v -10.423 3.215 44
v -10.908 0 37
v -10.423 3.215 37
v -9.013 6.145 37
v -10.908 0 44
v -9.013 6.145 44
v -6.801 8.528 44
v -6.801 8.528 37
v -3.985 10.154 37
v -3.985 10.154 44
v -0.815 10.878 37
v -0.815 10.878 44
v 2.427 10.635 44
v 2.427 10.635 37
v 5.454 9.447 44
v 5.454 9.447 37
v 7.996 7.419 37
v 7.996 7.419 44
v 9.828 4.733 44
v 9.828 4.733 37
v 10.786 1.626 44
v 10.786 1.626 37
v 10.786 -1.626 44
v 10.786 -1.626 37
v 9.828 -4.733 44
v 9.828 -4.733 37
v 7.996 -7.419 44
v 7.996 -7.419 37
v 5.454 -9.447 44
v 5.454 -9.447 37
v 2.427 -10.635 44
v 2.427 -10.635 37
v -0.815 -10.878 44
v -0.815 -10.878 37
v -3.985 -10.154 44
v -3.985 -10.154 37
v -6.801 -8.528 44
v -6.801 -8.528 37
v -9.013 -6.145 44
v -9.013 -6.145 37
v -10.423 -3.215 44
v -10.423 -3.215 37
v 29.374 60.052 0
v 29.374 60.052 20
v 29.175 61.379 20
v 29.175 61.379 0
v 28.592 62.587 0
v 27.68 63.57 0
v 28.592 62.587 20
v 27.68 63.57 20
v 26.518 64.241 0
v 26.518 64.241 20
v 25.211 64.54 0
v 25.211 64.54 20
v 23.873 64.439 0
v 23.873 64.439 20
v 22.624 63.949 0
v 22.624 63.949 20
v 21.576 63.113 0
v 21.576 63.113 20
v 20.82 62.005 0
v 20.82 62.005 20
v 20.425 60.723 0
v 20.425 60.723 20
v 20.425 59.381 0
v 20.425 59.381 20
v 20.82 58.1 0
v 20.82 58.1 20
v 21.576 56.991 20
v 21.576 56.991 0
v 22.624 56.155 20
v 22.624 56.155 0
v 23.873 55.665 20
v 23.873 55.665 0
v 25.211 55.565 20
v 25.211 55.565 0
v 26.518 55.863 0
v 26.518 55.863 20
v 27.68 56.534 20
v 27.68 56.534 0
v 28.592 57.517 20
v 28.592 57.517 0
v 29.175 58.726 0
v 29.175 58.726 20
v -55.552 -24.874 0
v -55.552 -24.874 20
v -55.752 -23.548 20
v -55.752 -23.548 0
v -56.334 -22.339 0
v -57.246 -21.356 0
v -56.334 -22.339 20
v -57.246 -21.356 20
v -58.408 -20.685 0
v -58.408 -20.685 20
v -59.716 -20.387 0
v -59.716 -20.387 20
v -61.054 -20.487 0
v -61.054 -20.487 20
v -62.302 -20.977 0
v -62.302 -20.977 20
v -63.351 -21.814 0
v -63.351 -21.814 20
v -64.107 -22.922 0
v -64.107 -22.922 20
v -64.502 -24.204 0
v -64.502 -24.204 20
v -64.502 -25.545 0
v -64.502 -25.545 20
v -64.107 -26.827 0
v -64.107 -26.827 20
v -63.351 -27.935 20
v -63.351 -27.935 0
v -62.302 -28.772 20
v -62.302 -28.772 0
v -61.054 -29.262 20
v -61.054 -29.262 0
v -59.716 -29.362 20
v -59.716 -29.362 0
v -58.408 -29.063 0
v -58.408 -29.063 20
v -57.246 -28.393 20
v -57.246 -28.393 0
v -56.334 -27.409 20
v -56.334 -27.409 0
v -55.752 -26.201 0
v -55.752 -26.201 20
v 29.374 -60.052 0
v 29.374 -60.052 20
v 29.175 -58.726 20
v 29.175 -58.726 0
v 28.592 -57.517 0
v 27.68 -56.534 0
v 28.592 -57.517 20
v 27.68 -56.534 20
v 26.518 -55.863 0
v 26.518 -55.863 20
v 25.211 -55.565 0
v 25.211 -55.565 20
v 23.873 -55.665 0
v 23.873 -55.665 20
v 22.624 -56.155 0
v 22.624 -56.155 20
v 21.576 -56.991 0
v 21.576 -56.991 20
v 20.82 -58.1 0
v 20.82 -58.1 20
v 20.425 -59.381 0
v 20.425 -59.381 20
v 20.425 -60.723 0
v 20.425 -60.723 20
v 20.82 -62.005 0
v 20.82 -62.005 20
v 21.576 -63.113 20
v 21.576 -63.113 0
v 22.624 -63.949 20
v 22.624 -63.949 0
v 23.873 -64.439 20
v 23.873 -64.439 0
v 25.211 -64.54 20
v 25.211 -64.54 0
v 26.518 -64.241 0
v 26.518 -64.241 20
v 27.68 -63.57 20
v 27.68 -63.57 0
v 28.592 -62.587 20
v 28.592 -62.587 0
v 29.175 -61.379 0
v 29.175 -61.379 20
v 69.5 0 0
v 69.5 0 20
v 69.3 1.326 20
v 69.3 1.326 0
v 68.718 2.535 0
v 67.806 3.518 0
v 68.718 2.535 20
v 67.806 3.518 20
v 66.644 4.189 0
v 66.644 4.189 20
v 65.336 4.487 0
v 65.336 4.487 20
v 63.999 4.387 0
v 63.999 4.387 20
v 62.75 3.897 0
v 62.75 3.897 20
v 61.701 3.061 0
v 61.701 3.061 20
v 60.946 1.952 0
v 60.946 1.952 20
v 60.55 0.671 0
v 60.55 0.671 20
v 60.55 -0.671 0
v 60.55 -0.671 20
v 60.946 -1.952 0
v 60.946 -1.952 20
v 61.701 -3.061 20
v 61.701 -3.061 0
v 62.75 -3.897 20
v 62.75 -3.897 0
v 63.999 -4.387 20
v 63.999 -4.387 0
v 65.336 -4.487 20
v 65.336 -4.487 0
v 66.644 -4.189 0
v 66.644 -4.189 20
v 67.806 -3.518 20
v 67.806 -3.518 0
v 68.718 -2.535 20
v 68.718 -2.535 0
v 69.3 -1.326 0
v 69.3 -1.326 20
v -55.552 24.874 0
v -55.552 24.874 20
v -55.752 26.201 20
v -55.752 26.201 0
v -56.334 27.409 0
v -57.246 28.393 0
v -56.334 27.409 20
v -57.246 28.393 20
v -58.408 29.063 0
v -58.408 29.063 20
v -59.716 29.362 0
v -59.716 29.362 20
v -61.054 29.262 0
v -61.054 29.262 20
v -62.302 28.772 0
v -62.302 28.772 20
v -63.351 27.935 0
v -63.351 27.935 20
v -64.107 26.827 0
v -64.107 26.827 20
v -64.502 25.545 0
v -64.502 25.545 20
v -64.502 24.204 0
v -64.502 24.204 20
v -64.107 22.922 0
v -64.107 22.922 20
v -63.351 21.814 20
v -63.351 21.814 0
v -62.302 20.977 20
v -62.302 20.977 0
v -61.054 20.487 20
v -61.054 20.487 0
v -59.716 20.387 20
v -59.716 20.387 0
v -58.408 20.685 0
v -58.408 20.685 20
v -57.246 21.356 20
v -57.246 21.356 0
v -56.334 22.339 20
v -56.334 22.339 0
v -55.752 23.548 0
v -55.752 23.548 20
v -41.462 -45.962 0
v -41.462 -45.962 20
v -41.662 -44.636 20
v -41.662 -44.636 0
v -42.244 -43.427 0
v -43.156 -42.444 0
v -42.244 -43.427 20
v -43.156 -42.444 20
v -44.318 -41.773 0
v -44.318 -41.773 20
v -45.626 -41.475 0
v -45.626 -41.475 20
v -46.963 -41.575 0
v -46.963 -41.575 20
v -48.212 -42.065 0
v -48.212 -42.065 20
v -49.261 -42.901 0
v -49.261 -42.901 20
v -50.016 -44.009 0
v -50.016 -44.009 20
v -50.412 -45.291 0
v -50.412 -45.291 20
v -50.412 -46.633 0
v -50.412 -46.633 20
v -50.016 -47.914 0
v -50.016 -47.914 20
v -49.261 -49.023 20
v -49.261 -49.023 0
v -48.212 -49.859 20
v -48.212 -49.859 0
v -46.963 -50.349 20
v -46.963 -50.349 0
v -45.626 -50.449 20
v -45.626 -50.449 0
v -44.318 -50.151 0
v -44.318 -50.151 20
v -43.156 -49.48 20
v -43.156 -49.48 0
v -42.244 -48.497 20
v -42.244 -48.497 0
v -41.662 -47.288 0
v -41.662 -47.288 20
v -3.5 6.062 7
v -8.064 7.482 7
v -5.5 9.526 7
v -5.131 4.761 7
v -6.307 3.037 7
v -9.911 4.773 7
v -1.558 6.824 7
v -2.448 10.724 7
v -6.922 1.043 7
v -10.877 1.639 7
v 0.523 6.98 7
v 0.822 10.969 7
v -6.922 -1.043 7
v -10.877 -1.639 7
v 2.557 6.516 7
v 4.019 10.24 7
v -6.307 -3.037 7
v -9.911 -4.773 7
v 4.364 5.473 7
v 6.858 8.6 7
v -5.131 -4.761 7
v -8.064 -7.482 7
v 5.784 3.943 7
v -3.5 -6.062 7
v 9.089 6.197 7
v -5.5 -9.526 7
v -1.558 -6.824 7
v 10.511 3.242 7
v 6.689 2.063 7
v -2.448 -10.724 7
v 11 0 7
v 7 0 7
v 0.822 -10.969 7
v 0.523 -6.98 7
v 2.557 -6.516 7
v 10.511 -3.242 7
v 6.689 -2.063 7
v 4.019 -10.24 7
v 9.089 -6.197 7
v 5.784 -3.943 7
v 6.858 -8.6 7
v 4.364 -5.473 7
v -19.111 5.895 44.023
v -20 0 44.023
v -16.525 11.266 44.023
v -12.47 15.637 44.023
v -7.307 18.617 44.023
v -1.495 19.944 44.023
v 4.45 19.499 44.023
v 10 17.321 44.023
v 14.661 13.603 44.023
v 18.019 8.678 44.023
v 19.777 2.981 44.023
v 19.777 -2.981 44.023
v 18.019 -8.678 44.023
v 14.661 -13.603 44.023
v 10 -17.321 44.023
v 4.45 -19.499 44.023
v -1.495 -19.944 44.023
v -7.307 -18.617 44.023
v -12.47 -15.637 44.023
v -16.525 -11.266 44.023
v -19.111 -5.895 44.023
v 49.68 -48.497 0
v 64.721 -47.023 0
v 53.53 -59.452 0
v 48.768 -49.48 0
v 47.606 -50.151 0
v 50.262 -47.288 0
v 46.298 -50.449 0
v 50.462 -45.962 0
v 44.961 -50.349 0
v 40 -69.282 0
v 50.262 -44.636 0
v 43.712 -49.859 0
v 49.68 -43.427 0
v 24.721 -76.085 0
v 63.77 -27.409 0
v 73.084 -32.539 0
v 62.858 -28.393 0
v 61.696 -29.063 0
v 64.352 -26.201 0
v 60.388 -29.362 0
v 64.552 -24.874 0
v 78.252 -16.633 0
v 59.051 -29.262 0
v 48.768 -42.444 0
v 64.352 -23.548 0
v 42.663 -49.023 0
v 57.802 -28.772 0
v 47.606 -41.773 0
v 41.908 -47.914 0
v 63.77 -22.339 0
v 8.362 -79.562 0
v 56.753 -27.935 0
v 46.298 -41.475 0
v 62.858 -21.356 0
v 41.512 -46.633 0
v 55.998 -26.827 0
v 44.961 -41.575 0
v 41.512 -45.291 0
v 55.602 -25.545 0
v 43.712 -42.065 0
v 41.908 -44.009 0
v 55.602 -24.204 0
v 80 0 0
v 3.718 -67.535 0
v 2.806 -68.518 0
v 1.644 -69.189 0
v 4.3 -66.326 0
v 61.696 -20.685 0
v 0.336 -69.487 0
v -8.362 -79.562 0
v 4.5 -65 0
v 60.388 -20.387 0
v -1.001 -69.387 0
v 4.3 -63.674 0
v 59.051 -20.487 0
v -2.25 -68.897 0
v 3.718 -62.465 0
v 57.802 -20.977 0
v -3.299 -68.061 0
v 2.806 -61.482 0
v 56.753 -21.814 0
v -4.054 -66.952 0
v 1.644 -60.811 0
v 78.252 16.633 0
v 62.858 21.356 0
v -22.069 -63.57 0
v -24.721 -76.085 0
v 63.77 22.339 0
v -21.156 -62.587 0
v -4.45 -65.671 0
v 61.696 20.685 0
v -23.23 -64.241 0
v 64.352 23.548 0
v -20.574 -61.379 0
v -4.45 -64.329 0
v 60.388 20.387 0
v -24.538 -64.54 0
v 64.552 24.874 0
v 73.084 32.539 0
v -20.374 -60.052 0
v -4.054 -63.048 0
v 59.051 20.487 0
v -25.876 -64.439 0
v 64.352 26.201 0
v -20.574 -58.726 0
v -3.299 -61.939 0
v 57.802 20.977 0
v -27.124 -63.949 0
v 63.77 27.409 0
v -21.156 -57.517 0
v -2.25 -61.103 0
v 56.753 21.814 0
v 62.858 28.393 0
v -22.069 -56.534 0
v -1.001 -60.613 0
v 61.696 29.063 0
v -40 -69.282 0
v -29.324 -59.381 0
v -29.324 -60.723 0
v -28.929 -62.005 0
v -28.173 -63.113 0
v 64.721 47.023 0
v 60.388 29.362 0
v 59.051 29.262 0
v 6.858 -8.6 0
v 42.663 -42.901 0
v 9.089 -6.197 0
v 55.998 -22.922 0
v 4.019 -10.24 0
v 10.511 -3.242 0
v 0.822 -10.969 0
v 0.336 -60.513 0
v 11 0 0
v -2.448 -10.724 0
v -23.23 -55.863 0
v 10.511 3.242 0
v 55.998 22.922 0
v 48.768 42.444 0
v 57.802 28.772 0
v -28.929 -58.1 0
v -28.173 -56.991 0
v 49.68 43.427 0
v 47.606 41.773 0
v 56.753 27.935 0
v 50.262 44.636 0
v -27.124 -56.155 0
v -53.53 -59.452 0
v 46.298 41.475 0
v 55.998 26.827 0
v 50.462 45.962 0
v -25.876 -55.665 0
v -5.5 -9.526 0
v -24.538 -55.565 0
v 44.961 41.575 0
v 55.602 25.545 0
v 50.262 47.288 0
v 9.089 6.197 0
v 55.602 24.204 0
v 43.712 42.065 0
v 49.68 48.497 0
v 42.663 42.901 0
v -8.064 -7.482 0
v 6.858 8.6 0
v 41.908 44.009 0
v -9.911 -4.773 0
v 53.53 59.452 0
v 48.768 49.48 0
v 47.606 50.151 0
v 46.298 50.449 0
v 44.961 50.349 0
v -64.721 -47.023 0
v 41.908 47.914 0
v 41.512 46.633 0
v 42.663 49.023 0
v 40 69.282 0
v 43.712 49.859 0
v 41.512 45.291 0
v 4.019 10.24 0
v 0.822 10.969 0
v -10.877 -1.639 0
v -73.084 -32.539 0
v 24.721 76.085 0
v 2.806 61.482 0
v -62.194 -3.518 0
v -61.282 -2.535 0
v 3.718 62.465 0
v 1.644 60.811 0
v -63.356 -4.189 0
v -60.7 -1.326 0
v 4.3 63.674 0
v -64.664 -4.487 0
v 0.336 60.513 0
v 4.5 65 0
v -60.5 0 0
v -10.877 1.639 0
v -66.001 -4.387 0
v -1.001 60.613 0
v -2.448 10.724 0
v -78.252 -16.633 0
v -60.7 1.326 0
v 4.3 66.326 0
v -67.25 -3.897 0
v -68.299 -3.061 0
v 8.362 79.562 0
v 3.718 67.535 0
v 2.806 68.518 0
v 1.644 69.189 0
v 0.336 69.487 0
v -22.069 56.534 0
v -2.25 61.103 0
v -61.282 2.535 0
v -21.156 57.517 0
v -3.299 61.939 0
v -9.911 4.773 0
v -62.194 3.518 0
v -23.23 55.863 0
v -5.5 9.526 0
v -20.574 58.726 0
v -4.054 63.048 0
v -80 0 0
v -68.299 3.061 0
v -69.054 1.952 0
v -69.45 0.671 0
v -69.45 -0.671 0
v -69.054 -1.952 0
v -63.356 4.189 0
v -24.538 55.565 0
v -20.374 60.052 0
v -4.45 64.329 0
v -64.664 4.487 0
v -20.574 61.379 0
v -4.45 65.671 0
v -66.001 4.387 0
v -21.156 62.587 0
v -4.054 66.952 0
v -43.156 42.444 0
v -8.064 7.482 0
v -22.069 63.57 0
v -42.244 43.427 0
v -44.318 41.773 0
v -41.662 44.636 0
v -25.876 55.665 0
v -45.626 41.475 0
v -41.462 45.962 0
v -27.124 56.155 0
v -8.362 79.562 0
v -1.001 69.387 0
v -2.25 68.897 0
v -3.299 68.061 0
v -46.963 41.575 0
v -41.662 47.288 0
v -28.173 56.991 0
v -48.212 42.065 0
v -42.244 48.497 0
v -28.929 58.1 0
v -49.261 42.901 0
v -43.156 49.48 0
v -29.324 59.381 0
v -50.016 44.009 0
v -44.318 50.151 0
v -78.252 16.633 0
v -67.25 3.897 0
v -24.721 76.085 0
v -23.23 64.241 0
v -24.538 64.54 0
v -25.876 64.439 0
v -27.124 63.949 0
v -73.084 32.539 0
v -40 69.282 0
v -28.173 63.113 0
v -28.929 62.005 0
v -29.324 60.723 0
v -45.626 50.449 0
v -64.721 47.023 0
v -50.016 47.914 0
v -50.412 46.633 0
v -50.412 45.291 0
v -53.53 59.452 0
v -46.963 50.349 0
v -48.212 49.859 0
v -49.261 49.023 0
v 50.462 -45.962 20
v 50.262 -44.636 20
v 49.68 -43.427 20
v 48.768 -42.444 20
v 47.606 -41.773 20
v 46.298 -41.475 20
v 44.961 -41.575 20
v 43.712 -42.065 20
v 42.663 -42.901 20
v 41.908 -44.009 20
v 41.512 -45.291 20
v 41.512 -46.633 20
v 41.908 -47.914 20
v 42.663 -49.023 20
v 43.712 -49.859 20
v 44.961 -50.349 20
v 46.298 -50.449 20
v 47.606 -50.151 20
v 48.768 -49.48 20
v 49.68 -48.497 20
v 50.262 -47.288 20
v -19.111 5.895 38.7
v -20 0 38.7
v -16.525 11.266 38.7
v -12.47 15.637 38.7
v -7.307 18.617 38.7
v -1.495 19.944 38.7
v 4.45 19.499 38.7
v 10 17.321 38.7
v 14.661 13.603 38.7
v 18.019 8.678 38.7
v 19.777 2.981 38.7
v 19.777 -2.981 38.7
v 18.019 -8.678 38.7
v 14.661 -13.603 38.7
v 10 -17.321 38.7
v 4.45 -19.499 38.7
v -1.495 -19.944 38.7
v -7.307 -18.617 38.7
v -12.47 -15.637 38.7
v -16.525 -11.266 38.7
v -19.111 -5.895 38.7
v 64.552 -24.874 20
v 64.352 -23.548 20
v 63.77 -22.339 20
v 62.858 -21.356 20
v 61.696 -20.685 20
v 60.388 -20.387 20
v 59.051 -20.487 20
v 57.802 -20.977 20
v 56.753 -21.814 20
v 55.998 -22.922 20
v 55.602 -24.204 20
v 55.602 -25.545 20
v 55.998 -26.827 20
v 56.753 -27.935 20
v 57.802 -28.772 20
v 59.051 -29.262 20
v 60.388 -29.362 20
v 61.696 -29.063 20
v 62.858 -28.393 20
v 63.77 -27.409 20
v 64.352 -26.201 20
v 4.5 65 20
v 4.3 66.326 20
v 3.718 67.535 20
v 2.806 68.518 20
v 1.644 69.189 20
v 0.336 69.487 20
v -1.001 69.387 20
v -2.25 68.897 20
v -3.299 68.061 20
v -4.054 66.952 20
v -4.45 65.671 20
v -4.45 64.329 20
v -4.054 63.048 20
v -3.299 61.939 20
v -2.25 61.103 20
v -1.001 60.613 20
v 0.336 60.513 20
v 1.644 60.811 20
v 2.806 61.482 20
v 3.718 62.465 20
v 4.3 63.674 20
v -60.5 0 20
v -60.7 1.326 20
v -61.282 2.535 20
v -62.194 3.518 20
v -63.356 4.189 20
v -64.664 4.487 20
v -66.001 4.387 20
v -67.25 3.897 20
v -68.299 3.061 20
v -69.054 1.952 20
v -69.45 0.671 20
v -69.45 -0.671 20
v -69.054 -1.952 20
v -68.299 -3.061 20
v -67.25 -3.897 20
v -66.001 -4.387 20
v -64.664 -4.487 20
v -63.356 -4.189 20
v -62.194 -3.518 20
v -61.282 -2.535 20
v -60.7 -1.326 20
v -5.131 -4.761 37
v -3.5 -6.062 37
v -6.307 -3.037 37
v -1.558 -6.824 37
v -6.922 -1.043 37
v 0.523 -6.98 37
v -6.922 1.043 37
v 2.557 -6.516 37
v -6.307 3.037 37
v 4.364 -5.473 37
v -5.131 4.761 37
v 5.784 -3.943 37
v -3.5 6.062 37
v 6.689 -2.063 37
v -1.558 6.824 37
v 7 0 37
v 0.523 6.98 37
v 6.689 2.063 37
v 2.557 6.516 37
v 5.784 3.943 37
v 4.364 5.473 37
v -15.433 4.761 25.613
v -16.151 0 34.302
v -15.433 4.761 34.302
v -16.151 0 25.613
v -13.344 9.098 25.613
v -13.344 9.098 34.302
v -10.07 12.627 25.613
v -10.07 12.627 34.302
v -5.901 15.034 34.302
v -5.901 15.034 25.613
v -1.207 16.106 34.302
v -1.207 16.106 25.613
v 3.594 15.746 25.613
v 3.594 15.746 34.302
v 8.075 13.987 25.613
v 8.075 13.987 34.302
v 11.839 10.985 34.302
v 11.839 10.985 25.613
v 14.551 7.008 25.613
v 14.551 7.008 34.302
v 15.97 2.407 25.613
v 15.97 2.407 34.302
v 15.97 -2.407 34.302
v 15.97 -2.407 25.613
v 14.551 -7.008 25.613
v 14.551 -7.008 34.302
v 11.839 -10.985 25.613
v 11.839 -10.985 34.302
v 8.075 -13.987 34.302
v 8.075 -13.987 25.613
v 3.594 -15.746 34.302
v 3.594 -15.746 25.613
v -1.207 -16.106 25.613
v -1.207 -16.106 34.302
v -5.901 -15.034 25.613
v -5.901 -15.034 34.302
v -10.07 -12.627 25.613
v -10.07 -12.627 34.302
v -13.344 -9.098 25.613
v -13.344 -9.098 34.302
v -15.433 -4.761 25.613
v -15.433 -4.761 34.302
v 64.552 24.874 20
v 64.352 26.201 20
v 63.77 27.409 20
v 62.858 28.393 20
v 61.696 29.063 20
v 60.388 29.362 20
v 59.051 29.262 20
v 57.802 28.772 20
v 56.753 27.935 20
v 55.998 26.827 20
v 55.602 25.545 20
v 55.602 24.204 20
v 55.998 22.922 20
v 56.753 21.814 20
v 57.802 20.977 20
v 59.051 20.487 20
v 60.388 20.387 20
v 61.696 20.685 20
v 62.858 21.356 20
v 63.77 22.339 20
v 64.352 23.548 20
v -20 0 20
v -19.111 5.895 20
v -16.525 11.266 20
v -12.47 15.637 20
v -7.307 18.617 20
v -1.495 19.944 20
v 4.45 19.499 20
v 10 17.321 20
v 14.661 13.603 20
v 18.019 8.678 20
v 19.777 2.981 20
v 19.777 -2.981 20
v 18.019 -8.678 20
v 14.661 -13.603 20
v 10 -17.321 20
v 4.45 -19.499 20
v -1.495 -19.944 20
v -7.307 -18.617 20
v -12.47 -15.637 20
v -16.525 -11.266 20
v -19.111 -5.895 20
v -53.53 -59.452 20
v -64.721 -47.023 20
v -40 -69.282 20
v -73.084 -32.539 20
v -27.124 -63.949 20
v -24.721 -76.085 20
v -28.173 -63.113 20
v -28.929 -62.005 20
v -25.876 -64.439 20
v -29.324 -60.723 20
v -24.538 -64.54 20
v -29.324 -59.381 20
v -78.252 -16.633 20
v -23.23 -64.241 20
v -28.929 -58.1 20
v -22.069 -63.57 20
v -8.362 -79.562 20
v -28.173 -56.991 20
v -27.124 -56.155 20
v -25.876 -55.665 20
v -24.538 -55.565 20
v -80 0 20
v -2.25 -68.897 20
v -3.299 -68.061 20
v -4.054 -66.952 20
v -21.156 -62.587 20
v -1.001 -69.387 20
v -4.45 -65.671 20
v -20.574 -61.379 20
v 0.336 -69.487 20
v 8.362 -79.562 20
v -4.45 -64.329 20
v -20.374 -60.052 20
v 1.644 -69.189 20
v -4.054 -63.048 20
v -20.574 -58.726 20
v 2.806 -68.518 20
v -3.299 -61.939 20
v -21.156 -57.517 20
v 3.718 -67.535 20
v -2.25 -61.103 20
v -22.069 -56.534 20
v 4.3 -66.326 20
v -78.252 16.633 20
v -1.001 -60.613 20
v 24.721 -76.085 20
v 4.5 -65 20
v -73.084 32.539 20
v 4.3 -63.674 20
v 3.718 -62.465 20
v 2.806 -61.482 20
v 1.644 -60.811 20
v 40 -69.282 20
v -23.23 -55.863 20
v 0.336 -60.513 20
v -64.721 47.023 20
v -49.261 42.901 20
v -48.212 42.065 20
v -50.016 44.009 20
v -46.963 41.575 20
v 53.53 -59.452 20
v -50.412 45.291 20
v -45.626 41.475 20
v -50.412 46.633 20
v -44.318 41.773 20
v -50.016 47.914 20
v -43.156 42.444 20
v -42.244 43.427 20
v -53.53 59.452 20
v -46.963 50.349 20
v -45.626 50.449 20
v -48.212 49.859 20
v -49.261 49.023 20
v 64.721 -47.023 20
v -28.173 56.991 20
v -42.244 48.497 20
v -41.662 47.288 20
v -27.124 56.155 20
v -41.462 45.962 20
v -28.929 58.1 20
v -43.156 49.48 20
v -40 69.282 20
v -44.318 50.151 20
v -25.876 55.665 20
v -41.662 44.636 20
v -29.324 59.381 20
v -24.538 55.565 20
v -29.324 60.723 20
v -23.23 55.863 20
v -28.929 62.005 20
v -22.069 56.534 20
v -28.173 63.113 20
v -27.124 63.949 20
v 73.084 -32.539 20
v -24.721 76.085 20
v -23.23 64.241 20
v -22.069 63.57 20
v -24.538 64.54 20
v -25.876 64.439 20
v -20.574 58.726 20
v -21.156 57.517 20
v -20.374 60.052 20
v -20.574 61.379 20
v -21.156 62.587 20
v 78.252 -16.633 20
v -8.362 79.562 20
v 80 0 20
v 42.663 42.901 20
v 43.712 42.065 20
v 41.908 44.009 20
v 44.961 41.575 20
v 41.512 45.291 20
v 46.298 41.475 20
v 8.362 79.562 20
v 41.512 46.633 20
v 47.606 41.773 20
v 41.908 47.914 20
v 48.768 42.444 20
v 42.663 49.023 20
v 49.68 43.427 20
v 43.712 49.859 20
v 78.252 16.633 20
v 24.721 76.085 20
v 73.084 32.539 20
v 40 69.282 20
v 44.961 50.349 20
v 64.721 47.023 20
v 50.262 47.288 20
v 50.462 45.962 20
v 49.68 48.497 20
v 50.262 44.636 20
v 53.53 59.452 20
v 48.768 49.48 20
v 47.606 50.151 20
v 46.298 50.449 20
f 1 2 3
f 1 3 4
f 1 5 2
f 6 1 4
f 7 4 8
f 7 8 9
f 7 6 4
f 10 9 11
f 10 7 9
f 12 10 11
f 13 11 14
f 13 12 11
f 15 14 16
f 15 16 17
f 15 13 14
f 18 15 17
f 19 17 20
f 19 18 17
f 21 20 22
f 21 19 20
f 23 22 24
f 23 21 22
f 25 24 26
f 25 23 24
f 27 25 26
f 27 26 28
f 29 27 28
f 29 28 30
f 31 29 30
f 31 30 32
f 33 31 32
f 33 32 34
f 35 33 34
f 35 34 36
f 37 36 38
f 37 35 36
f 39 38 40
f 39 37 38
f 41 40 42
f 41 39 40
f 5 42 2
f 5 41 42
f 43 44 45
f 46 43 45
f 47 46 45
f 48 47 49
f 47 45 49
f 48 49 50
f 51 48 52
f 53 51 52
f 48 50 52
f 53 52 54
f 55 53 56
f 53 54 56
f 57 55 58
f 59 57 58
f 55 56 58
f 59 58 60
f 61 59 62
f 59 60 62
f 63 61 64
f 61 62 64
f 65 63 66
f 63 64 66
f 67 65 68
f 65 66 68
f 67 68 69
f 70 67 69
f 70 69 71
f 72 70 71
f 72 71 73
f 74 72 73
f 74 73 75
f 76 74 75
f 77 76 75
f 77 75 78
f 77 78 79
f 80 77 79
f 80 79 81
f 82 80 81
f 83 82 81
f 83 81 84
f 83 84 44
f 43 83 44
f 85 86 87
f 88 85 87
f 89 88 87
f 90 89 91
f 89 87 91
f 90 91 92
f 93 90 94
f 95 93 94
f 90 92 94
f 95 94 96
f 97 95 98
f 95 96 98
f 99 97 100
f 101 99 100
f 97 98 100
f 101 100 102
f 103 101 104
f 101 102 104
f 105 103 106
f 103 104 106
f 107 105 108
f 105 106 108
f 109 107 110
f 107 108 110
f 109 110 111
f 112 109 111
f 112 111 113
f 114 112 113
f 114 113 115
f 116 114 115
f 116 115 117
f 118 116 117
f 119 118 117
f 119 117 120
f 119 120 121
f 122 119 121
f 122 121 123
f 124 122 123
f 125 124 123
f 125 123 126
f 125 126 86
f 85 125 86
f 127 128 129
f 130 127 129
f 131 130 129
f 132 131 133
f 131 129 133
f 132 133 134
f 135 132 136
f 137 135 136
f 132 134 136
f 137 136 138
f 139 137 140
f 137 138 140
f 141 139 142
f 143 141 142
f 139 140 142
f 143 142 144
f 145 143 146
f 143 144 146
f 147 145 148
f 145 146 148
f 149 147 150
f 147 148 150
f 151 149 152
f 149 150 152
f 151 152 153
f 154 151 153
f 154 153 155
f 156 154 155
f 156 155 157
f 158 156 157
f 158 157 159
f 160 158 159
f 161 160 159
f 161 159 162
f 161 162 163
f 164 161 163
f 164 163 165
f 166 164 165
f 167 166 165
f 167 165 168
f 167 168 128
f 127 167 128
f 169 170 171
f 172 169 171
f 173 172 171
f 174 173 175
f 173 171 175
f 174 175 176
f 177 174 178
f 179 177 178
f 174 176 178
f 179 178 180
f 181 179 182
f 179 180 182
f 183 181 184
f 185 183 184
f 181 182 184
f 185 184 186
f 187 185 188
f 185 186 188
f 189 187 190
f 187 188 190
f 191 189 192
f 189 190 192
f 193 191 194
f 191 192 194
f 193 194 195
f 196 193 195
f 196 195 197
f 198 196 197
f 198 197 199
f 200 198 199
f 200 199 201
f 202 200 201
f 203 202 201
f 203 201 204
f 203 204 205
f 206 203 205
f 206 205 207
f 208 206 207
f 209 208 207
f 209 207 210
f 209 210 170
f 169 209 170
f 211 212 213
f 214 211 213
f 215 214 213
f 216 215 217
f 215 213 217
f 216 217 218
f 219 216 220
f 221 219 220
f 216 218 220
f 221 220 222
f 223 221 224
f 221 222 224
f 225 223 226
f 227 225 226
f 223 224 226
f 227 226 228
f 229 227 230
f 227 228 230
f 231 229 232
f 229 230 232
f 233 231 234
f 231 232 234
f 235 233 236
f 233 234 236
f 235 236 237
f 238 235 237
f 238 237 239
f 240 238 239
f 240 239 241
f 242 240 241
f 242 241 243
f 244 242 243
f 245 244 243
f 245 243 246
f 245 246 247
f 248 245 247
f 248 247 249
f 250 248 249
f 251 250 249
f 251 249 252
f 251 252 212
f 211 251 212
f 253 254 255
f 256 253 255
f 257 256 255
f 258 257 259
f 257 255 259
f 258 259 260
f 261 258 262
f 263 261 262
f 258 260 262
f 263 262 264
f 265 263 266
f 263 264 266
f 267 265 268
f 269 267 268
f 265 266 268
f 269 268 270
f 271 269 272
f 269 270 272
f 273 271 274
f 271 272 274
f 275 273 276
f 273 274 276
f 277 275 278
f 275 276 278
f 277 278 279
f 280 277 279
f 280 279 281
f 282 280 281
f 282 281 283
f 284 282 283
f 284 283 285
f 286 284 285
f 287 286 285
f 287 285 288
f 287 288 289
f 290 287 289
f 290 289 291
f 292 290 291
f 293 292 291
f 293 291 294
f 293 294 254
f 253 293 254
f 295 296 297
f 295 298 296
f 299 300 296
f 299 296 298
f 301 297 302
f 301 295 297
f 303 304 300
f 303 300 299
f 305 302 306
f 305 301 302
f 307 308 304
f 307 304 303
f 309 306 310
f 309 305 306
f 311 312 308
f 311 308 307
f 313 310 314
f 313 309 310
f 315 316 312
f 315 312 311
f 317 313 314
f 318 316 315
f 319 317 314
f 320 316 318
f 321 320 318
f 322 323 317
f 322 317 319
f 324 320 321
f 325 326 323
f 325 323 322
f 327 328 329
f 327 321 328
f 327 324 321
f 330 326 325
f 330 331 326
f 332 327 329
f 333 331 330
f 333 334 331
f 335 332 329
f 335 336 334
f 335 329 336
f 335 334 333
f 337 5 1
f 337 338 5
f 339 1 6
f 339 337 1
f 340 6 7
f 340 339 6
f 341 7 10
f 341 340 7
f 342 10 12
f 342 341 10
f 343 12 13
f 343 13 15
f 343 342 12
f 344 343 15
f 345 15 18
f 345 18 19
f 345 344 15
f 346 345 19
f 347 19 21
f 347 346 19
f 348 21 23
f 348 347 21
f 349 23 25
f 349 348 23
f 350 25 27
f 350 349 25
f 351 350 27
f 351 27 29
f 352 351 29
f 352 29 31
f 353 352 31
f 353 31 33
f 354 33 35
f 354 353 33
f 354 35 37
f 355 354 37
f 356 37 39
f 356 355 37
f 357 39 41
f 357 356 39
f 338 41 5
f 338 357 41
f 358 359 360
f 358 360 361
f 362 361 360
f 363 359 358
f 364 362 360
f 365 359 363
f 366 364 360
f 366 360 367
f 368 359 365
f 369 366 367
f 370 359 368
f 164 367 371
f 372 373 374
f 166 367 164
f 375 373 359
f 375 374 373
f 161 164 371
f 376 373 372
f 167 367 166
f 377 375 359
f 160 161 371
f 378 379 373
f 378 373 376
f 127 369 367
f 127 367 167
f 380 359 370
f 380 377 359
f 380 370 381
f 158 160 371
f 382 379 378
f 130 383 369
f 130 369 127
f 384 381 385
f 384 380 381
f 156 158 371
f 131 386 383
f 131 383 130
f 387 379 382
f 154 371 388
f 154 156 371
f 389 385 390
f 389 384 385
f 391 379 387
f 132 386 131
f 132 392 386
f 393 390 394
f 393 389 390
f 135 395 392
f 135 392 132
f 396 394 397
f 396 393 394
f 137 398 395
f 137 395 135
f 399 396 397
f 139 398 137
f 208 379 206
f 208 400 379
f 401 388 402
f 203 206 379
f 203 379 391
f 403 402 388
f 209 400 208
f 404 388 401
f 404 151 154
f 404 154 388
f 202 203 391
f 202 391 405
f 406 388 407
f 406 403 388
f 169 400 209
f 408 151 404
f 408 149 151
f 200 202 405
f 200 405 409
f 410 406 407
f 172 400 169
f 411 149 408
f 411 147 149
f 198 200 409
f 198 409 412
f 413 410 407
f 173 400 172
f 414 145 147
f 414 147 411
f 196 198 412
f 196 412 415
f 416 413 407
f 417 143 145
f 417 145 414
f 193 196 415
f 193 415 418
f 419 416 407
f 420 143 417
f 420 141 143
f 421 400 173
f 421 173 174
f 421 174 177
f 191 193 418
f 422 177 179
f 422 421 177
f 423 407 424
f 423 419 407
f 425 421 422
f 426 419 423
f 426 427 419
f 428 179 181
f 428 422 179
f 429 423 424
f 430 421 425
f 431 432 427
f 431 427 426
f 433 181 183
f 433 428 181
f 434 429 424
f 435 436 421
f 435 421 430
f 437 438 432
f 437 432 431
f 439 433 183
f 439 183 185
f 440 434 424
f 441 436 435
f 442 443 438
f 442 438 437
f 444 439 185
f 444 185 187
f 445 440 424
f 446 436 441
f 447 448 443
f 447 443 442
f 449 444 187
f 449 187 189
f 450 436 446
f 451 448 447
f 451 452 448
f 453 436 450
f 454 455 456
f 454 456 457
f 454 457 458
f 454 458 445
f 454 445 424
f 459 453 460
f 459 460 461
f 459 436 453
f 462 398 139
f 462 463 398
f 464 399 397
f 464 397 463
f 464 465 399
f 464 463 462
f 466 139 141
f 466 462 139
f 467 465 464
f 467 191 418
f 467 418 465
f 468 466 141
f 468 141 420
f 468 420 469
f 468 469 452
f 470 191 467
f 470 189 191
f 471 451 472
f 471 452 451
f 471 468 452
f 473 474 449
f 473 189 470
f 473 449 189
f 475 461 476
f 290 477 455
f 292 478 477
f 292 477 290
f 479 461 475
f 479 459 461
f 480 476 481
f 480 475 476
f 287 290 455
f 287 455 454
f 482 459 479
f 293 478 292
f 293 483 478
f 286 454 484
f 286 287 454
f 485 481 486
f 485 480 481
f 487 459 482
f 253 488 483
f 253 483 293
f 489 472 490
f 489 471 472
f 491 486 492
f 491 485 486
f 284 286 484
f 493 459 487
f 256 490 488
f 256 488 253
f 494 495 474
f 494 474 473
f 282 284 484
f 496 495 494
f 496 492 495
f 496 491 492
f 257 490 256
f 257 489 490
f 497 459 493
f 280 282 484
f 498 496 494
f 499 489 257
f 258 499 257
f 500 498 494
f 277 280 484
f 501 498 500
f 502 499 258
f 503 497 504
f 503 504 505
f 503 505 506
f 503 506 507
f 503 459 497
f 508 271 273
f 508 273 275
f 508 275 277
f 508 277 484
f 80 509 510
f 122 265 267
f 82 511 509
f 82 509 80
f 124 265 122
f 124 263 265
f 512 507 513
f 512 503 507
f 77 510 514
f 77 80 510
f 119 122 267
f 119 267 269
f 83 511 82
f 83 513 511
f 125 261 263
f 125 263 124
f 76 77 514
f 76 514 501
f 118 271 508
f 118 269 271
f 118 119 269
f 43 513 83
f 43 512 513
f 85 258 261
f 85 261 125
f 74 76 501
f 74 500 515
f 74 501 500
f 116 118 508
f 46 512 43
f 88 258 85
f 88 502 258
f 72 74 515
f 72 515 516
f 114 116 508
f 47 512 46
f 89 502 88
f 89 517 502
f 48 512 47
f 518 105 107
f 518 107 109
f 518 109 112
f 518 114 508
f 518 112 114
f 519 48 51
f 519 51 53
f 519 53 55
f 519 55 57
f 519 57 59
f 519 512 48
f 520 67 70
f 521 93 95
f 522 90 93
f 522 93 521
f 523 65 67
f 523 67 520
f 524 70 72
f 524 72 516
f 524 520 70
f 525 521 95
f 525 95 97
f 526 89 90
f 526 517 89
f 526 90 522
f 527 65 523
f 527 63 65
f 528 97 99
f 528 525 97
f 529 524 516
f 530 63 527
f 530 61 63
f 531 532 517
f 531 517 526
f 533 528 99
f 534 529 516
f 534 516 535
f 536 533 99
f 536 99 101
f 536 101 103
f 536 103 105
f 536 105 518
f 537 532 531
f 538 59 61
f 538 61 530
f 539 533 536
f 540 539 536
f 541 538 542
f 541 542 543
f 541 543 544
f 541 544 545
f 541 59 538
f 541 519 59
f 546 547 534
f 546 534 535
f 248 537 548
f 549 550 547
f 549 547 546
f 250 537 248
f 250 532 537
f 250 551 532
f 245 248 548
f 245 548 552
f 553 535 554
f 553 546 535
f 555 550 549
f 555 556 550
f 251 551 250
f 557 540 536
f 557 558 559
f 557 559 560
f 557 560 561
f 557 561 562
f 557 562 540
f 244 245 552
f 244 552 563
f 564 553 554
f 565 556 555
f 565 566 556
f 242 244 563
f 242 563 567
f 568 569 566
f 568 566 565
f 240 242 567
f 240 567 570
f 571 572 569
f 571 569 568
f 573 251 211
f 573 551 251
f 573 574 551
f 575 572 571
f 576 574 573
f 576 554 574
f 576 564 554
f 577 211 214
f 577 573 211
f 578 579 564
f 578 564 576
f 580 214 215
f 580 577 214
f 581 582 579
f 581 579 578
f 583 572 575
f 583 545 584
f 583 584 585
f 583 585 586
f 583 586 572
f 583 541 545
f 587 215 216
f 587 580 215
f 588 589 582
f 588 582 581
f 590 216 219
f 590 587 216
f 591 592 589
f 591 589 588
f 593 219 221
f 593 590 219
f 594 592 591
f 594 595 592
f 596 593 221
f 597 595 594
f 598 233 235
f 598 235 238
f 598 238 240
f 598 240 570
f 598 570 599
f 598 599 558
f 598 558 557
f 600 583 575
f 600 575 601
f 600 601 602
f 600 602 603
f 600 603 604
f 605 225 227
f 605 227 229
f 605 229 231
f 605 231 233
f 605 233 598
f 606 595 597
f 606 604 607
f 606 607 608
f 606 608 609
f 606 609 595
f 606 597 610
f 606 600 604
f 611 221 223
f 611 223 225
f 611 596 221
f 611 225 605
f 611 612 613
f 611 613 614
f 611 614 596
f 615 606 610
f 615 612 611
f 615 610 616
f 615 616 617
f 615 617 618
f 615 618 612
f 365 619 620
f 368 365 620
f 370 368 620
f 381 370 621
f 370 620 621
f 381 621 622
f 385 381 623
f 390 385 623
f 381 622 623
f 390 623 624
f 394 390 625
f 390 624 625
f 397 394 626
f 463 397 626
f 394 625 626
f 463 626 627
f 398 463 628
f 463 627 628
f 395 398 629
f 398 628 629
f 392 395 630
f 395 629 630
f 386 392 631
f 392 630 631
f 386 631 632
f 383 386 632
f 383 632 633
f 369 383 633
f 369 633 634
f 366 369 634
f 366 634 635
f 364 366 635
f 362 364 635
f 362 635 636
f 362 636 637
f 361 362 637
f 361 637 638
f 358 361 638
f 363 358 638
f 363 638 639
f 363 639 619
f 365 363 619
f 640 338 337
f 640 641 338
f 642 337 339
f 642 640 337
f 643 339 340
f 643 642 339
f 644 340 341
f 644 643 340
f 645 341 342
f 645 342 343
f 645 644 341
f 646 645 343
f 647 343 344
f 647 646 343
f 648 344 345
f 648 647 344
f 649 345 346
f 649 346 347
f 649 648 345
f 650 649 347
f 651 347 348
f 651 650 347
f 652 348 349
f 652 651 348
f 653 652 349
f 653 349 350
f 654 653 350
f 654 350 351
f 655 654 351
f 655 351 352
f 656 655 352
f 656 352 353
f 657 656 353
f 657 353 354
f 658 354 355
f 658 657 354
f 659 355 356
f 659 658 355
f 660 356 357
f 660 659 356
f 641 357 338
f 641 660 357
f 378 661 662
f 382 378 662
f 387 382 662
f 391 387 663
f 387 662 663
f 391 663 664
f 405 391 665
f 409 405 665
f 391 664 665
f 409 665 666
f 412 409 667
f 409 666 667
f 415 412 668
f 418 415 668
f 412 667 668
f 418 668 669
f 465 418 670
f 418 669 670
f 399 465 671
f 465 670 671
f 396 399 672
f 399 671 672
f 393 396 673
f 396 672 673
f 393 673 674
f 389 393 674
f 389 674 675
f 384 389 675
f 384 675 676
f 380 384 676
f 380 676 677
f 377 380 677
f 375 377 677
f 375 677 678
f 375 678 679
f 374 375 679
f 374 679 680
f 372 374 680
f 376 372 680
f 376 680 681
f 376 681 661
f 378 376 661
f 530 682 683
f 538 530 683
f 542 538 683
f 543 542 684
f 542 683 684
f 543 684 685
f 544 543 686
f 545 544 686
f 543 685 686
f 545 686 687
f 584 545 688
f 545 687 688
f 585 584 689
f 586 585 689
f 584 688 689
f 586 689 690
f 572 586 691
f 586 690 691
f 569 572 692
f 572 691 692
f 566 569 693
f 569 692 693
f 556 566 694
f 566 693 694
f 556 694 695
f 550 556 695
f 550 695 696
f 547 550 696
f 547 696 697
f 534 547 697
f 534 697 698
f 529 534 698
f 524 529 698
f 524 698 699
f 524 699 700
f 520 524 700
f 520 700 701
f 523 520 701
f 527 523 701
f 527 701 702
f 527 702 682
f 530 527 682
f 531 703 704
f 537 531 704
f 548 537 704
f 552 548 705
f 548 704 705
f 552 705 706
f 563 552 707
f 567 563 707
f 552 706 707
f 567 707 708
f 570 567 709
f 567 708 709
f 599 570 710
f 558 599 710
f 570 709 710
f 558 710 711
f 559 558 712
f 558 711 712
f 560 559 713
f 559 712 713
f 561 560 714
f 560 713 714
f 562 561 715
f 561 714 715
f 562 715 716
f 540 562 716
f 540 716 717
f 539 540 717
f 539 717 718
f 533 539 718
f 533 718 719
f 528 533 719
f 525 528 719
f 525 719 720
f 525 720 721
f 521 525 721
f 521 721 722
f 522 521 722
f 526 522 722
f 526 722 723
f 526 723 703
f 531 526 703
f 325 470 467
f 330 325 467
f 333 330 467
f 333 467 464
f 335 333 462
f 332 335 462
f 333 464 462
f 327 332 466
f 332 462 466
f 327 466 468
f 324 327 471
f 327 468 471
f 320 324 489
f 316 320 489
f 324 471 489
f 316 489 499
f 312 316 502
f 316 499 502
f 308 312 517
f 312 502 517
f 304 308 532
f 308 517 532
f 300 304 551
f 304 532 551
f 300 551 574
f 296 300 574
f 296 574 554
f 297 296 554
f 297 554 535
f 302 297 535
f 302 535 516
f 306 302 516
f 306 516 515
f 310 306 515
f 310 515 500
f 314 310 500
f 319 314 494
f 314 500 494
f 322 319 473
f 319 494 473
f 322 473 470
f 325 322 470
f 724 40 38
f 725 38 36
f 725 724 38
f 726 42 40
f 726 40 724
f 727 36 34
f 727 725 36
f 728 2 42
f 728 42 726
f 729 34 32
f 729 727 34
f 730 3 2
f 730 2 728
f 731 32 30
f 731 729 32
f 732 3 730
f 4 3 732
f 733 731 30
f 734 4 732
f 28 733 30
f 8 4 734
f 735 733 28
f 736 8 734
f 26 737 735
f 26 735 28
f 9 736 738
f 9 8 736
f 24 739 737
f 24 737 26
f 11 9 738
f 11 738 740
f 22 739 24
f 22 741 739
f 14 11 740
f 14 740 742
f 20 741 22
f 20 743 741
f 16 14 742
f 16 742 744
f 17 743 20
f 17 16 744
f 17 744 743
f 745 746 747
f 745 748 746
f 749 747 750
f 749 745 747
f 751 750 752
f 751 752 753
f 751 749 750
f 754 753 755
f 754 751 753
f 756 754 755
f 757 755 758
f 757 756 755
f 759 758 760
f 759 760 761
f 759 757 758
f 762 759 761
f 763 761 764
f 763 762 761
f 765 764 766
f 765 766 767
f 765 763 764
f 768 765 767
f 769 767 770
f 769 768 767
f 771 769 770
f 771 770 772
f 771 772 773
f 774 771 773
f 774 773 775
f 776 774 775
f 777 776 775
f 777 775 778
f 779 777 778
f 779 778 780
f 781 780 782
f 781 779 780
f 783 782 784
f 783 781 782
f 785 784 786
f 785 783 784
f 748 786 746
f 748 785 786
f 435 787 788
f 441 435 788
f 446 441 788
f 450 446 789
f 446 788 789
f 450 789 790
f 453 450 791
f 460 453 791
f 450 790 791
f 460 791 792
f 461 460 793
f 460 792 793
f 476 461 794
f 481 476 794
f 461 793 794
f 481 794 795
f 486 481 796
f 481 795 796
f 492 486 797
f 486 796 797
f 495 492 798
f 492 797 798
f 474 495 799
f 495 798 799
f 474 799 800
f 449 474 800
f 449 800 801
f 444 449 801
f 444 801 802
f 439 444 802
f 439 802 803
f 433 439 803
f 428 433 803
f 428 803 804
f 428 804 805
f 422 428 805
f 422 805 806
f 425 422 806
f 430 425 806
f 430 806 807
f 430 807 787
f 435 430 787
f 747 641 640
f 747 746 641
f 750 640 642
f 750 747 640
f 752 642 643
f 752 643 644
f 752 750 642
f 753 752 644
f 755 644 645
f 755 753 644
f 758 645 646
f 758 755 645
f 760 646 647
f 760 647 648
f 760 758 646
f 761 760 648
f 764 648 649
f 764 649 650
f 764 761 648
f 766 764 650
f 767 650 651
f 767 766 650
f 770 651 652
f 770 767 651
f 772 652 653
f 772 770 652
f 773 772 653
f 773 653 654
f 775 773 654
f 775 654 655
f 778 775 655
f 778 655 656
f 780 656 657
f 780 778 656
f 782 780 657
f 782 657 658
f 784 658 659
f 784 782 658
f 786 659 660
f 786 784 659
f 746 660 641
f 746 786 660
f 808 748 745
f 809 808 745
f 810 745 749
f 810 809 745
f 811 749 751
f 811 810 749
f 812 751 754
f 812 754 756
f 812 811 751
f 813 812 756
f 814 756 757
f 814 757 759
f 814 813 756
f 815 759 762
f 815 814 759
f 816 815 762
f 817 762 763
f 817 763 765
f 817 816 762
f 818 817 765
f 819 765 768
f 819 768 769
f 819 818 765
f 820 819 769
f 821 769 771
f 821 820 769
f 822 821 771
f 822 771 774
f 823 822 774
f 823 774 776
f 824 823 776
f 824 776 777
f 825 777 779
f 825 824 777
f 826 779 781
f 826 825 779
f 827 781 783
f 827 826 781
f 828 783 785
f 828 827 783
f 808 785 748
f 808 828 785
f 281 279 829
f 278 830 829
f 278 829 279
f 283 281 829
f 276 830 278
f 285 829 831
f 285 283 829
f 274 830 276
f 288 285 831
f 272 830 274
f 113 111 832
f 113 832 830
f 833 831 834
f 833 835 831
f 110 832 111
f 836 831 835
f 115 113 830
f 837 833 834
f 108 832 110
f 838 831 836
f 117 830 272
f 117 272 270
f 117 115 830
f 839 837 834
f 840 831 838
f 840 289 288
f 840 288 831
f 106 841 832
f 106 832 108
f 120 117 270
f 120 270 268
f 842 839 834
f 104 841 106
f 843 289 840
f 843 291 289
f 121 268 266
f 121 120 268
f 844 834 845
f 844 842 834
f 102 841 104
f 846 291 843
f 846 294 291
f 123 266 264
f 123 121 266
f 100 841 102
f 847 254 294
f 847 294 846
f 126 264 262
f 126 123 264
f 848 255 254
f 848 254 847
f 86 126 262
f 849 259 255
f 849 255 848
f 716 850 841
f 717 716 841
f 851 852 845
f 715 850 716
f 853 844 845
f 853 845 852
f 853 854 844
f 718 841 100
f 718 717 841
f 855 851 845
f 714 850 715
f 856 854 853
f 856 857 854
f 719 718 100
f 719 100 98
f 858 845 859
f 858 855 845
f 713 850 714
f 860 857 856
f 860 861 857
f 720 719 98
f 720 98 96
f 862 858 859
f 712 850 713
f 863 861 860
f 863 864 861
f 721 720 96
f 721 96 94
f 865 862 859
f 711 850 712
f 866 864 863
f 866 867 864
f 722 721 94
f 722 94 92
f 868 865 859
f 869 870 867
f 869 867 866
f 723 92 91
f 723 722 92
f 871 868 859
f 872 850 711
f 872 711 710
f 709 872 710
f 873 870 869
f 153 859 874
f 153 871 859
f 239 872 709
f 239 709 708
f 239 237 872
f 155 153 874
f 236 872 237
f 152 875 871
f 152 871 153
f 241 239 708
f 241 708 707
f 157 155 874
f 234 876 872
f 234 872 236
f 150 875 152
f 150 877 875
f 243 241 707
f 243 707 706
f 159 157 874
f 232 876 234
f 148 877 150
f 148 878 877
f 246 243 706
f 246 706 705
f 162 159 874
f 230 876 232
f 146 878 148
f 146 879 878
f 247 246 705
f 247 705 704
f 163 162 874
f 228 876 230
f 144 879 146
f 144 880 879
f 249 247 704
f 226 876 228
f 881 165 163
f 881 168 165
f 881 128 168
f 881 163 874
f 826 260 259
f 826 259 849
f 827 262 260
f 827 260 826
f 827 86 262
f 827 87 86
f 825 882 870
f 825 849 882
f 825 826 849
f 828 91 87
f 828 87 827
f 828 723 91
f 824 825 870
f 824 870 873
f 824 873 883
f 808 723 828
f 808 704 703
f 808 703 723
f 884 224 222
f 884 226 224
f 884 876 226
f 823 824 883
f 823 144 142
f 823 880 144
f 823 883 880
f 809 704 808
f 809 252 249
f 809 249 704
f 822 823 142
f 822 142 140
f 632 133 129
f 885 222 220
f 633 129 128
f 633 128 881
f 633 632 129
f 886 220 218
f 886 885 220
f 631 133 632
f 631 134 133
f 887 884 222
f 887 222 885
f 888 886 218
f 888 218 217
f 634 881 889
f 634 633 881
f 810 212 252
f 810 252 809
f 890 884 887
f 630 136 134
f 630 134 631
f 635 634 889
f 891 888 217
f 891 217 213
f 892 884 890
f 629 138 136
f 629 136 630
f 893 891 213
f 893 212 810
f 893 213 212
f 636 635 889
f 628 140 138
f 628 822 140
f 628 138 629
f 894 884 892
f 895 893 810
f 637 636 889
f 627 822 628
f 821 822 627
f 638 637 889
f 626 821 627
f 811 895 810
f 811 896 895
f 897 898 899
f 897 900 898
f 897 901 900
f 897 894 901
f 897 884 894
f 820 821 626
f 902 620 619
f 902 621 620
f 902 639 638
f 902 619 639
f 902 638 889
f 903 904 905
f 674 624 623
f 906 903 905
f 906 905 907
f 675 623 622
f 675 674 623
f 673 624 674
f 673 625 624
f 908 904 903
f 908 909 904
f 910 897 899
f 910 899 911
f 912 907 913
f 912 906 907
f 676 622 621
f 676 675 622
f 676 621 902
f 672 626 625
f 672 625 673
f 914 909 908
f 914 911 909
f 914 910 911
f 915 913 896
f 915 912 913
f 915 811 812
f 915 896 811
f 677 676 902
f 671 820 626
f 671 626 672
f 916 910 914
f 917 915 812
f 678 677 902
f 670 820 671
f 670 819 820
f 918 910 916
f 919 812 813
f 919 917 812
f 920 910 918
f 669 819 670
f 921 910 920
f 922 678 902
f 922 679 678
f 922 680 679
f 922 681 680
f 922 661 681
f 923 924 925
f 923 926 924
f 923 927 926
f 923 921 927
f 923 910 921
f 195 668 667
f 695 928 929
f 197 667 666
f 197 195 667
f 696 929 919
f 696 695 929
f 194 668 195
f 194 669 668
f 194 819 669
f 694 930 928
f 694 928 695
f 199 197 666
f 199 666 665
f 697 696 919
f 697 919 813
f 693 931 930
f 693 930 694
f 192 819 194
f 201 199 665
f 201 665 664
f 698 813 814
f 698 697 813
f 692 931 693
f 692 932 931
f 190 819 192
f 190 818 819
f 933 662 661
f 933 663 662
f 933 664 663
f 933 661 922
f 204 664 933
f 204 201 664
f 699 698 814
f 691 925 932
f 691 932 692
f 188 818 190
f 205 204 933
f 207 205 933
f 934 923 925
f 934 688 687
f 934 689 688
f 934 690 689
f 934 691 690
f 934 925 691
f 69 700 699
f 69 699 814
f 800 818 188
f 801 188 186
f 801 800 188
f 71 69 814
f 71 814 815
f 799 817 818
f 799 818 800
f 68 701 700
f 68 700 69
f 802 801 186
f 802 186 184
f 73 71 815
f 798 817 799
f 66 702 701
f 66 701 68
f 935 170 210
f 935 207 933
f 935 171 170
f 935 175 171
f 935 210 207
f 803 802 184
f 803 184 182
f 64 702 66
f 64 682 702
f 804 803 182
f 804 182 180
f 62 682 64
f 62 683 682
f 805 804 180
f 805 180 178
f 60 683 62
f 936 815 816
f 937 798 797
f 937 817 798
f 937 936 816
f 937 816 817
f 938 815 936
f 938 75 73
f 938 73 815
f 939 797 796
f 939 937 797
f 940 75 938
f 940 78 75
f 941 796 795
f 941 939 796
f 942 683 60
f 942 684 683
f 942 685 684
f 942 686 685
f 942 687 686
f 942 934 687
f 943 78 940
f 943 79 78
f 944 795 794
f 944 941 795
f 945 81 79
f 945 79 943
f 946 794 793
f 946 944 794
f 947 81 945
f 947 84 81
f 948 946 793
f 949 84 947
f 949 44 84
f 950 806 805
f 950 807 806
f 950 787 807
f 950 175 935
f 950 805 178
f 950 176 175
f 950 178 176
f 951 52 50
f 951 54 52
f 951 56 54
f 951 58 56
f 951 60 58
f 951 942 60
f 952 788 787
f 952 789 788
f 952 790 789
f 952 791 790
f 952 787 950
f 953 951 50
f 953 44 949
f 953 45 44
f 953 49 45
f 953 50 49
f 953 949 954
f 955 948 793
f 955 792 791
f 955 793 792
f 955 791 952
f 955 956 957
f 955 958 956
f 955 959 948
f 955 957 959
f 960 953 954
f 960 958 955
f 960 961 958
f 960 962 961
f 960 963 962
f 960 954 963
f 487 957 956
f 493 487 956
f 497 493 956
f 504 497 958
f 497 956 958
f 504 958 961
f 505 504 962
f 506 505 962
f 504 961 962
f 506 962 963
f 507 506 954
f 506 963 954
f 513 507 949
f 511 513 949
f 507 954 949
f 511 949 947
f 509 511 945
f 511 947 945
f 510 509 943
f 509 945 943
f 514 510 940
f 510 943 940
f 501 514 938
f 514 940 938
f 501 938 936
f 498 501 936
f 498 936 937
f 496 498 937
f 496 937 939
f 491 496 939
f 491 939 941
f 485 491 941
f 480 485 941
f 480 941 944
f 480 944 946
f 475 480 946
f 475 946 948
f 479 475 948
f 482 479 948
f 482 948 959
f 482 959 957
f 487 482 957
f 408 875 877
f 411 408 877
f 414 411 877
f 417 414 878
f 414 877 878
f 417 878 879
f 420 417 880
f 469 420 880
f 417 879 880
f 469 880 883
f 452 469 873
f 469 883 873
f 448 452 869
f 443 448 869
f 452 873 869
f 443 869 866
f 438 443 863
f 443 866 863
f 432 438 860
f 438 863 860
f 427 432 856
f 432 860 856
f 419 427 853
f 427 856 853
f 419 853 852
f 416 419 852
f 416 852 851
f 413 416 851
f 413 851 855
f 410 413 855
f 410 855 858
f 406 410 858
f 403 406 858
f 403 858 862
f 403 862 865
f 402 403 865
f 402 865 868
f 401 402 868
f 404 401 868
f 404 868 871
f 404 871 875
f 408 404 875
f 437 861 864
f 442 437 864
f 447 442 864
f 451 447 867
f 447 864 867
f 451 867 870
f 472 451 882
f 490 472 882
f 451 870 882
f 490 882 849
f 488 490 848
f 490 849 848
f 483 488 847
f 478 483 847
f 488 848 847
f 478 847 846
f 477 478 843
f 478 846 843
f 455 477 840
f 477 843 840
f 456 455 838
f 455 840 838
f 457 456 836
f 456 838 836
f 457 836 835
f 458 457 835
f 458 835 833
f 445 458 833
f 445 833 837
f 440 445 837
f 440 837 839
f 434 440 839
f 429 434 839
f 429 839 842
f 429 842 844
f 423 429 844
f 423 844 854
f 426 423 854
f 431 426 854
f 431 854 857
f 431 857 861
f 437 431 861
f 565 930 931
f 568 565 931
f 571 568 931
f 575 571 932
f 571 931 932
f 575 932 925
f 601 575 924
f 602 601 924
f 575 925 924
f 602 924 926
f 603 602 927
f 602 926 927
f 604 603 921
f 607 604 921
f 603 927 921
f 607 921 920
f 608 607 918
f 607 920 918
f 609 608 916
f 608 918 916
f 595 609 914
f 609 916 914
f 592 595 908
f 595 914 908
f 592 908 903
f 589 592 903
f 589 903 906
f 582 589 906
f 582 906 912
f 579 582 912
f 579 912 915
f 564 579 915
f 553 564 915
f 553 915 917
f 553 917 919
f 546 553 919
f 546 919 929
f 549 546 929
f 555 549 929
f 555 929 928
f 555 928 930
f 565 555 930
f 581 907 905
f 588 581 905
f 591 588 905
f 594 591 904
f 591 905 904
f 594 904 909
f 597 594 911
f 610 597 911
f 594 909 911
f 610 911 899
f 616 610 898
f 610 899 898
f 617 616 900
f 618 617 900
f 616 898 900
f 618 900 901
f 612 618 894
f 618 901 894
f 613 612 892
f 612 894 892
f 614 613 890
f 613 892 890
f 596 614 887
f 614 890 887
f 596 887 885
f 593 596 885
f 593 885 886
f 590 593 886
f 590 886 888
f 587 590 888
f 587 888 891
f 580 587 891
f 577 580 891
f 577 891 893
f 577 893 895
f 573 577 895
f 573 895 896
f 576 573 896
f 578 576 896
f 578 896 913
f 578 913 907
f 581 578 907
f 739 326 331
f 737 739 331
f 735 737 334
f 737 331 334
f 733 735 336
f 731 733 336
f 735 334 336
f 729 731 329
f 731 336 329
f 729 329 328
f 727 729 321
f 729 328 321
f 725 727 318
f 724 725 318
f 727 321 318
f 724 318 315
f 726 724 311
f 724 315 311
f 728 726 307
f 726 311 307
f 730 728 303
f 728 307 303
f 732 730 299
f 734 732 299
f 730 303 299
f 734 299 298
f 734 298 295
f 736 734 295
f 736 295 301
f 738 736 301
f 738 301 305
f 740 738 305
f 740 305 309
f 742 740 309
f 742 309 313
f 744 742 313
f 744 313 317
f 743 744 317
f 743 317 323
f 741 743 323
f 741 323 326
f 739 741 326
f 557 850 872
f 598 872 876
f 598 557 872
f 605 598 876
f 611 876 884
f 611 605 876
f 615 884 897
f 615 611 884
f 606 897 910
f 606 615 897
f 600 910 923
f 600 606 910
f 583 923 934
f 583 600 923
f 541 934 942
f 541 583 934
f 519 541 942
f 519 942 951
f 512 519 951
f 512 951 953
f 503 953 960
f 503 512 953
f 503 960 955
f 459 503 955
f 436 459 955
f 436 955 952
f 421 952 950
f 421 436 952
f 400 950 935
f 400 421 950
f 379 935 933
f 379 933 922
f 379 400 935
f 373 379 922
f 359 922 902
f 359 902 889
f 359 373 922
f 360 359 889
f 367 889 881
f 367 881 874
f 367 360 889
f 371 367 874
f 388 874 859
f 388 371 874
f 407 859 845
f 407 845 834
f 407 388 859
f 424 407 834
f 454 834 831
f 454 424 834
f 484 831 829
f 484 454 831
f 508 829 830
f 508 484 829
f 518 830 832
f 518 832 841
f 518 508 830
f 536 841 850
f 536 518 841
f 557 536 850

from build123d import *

# Parameters (mm, degrees)
F0_W     = 11
F0_H     = 7
F2_R     = 11
F3_DEPTH = 7
F4_R     = 7
F5_DEPTH = 80
F6_R     = 4.5
F7_DEPTH = 41.7


with BuildPart() as f1:
    # F0 (on Front) → F1 (revolve)
    with BuildSketch(Plane.XZ):
        Polygon((-20, 20), (-80, 20), (-80, 0), (-11, 0), (-11, 7), (0, 7), (0, 20), (0, 37), (-10.908018, 37), (-10.908018, 44), (-20, 44.023235), (-20, 38.700003), (-16.150784, 34.302171), (-16.150784, 25.613375), align=None)
        with Locations((-5.5, 3.5)):
            Rectangle(F0_W, F0_H)
    revolve(axis=Axis((0, 0, 77.767195), (0, 0, -1)))

    # F2 (on face) → F3 (cut)
    with BuildSketch(Plane(origin=(0, 0, 0), x_dir=(1, 0, 0), z_dir=(0, 0, -1))):
        Circle(F2_R)
    extrude(amount=-F3_DEPTH, mode=Mode.SUBTRACT)

    # F4 (on face) → F5 (cut)
    with BuildSketch(Plane(origin=(0, 0, 7), x_dir=(1, 0, 0), z_dir=(0, 0, -1))):
        Circle(F4_R)
    extrude(amount=-F5_DEPTH, mode=Mode.SUBTRACT)

    # F6 (on face) → F7 (cut)
    with BuildSketch(Plane.XY.offset(20)):
        with Locations((-45.961941, 45.961941)):
            Circle(F6_R)
        with Locations((-24.874423, 60.05217)):
            Circle(F6_R)
        with Locations((0, 65)):
            Circle(F6_R)
        with Locations((24.874423, 60.05217)):
            Circle(F6_R)
        with Locations((45.961941, 45.961941)):
            Circle(F6_R)
        with Locations((60.05217, 24.874423)):
            Circle(F6_R)
        with Locations((65, 0)):
            Circle(F6_R)
        with Locations((60.05217, -24.874423)):
            Circle(F6_R)
        with Locations((45.961941, -45.961941)):
            Circle(F6_R)
        with Locations((24.874423, -60.05217)):
            Circle(F6_R)
        with Locations((0, -65)):
            Circle(F6_R)
        with Locations((-24.874423, -60.05217)):
            Circle(F6_R)
        with Locations((-45.961941, -45.961941)):
            Circle(F6_R)
        with Locations((-60.05217, -24.874423)):
            Circle(F6_R)
        with Locations((-65, 0)):
            Circle(F6_R)
        with Locations((-60.05217, 24.874423)):
            Circle(F6_R)
    extrude(amount=-F7_DEPTH, mode=Mode.SUBTRACT)


solid = f1.part
